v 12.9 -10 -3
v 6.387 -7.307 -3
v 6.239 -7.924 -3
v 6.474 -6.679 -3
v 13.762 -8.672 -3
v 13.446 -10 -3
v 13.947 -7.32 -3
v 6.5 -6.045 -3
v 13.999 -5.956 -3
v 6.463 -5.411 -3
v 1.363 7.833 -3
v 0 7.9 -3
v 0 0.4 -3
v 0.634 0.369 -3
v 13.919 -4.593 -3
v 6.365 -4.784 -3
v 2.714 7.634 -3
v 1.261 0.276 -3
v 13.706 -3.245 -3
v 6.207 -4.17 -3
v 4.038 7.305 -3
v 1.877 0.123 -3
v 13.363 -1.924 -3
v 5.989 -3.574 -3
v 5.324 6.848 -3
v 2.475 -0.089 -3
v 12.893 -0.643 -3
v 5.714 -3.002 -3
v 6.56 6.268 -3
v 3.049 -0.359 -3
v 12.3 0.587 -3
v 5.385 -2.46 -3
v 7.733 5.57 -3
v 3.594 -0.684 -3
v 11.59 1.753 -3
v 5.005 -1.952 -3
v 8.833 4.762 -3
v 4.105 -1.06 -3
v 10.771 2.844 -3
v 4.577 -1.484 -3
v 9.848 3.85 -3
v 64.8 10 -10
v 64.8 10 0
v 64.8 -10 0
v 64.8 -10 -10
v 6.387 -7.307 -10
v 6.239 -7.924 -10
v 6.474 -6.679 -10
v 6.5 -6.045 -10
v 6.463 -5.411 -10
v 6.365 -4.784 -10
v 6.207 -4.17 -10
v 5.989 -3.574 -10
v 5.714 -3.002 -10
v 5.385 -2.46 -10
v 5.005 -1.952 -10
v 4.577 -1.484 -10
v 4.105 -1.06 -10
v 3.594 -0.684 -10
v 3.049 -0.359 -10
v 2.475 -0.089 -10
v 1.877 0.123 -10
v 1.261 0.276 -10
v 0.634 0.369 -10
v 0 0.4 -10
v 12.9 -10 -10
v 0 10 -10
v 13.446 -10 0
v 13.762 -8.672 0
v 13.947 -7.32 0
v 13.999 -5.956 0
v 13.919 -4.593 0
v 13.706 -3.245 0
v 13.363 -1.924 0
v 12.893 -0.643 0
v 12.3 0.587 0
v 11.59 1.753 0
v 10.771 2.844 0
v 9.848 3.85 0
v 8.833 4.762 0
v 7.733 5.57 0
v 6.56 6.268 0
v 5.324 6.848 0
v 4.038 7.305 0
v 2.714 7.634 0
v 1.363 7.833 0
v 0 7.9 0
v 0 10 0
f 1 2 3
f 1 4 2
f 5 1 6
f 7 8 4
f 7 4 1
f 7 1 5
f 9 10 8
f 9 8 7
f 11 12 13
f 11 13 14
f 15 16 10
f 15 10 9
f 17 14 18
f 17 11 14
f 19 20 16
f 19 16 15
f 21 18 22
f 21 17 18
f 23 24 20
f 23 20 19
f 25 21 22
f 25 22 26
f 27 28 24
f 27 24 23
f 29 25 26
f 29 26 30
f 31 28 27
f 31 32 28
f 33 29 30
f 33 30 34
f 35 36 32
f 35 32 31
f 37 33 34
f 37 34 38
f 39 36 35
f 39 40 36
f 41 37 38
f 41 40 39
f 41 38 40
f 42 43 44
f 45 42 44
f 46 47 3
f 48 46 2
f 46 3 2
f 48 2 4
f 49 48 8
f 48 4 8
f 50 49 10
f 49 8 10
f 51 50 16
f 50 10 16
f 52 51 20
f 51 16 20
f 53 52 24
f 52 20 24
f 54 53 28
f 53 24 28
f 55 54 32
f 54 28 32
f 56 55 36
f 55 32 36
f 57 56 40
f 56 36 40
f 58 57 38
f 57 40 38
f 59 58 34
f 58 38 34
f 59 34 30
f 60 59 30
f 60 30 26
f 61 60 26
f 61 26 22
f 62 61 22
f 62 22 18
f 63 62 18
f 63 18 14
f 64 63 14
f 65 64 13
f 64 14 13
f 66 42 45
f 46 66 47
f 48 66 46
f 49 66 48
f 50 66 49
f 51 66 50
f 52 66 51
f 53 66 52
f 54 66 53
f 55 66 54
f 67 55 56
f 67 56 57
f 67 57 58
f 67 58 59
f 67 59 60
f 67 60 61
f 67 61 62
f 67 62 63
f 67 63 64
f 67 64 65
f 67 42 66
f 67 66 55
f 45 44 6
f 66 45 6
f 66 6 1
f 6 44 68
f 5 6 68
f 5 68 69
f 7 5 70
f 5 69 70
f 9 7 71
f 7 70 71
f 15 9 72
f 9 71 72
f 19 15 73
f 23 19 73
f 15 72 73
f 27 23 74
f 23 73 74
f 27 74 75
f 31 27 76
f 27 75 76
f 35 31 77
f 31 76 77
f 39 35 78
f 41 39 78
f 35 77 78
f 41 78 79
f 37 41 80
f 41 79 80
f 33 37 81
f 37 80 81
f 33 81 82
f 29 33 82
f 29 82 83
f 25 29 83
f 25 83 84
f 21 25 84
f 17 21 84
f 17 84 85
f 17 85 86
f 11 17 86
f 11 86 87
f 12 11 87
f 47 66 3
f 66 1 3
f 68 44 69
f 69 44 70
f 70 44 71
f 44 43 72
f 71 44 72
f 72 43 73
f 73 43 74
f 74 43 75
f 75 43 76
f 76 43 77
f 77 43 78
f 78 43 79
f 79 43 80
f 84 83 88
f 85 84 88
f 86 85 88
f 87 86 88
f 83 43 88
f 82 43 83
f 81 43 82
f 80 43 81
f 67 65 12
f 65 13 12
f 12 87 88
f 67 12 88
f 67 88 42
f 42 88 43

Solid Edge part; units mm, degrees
sketch "Sketch1" plane through (0, 0, 0) normal (0, 0, 1) x (1, 0, 0)
  line L0 (0, 0) -> (0, 10)
  line L1 (0, 10) -> (64.8, 10)
  line L2 (64.8, 10) -> (64.8, -10)
  line L3 (64.8, -10) -> (0, -10)
  line L4 (0, -10) -> (0, 0)
extrude "Protrusion1" add sketch "Sketch1" against normal blind 10
sketch "Sketch2" plane through (32.4, 0, 0) normal (0, 0, 1) x (1, 0, 0)
  circle A0 centre (-32.4, -6.1) radius 6.5
extrude "Recorte_Extrudado_1" cut sketch "Sketch2" against normal blind 10
sketch "Sketch3" plane through (32.4, 0, 0) normal (0, 0, 1) x (-1, 0, 0)
  circle A0 centre (32.4, 6.1) radius 14
extrude "Recorte_Extrudado_2" cut sketch "Sketch3" against normal blind 3
sketch "Sketch4" plane through (32.4, 0, 0) normal (0, 0, 1) x (1, 0, 0)
  line L0 (-27.2, -10) -> (-27.2, -7.6)
  line L1 (-19.5, -10) -> (-27.2, -7.6)
  line L2 (-27.2, -10) -> (-19.5, -10)
extrude "Recorte_Extrudado_3" cut sketch "Sketch4" against normal blind 10
